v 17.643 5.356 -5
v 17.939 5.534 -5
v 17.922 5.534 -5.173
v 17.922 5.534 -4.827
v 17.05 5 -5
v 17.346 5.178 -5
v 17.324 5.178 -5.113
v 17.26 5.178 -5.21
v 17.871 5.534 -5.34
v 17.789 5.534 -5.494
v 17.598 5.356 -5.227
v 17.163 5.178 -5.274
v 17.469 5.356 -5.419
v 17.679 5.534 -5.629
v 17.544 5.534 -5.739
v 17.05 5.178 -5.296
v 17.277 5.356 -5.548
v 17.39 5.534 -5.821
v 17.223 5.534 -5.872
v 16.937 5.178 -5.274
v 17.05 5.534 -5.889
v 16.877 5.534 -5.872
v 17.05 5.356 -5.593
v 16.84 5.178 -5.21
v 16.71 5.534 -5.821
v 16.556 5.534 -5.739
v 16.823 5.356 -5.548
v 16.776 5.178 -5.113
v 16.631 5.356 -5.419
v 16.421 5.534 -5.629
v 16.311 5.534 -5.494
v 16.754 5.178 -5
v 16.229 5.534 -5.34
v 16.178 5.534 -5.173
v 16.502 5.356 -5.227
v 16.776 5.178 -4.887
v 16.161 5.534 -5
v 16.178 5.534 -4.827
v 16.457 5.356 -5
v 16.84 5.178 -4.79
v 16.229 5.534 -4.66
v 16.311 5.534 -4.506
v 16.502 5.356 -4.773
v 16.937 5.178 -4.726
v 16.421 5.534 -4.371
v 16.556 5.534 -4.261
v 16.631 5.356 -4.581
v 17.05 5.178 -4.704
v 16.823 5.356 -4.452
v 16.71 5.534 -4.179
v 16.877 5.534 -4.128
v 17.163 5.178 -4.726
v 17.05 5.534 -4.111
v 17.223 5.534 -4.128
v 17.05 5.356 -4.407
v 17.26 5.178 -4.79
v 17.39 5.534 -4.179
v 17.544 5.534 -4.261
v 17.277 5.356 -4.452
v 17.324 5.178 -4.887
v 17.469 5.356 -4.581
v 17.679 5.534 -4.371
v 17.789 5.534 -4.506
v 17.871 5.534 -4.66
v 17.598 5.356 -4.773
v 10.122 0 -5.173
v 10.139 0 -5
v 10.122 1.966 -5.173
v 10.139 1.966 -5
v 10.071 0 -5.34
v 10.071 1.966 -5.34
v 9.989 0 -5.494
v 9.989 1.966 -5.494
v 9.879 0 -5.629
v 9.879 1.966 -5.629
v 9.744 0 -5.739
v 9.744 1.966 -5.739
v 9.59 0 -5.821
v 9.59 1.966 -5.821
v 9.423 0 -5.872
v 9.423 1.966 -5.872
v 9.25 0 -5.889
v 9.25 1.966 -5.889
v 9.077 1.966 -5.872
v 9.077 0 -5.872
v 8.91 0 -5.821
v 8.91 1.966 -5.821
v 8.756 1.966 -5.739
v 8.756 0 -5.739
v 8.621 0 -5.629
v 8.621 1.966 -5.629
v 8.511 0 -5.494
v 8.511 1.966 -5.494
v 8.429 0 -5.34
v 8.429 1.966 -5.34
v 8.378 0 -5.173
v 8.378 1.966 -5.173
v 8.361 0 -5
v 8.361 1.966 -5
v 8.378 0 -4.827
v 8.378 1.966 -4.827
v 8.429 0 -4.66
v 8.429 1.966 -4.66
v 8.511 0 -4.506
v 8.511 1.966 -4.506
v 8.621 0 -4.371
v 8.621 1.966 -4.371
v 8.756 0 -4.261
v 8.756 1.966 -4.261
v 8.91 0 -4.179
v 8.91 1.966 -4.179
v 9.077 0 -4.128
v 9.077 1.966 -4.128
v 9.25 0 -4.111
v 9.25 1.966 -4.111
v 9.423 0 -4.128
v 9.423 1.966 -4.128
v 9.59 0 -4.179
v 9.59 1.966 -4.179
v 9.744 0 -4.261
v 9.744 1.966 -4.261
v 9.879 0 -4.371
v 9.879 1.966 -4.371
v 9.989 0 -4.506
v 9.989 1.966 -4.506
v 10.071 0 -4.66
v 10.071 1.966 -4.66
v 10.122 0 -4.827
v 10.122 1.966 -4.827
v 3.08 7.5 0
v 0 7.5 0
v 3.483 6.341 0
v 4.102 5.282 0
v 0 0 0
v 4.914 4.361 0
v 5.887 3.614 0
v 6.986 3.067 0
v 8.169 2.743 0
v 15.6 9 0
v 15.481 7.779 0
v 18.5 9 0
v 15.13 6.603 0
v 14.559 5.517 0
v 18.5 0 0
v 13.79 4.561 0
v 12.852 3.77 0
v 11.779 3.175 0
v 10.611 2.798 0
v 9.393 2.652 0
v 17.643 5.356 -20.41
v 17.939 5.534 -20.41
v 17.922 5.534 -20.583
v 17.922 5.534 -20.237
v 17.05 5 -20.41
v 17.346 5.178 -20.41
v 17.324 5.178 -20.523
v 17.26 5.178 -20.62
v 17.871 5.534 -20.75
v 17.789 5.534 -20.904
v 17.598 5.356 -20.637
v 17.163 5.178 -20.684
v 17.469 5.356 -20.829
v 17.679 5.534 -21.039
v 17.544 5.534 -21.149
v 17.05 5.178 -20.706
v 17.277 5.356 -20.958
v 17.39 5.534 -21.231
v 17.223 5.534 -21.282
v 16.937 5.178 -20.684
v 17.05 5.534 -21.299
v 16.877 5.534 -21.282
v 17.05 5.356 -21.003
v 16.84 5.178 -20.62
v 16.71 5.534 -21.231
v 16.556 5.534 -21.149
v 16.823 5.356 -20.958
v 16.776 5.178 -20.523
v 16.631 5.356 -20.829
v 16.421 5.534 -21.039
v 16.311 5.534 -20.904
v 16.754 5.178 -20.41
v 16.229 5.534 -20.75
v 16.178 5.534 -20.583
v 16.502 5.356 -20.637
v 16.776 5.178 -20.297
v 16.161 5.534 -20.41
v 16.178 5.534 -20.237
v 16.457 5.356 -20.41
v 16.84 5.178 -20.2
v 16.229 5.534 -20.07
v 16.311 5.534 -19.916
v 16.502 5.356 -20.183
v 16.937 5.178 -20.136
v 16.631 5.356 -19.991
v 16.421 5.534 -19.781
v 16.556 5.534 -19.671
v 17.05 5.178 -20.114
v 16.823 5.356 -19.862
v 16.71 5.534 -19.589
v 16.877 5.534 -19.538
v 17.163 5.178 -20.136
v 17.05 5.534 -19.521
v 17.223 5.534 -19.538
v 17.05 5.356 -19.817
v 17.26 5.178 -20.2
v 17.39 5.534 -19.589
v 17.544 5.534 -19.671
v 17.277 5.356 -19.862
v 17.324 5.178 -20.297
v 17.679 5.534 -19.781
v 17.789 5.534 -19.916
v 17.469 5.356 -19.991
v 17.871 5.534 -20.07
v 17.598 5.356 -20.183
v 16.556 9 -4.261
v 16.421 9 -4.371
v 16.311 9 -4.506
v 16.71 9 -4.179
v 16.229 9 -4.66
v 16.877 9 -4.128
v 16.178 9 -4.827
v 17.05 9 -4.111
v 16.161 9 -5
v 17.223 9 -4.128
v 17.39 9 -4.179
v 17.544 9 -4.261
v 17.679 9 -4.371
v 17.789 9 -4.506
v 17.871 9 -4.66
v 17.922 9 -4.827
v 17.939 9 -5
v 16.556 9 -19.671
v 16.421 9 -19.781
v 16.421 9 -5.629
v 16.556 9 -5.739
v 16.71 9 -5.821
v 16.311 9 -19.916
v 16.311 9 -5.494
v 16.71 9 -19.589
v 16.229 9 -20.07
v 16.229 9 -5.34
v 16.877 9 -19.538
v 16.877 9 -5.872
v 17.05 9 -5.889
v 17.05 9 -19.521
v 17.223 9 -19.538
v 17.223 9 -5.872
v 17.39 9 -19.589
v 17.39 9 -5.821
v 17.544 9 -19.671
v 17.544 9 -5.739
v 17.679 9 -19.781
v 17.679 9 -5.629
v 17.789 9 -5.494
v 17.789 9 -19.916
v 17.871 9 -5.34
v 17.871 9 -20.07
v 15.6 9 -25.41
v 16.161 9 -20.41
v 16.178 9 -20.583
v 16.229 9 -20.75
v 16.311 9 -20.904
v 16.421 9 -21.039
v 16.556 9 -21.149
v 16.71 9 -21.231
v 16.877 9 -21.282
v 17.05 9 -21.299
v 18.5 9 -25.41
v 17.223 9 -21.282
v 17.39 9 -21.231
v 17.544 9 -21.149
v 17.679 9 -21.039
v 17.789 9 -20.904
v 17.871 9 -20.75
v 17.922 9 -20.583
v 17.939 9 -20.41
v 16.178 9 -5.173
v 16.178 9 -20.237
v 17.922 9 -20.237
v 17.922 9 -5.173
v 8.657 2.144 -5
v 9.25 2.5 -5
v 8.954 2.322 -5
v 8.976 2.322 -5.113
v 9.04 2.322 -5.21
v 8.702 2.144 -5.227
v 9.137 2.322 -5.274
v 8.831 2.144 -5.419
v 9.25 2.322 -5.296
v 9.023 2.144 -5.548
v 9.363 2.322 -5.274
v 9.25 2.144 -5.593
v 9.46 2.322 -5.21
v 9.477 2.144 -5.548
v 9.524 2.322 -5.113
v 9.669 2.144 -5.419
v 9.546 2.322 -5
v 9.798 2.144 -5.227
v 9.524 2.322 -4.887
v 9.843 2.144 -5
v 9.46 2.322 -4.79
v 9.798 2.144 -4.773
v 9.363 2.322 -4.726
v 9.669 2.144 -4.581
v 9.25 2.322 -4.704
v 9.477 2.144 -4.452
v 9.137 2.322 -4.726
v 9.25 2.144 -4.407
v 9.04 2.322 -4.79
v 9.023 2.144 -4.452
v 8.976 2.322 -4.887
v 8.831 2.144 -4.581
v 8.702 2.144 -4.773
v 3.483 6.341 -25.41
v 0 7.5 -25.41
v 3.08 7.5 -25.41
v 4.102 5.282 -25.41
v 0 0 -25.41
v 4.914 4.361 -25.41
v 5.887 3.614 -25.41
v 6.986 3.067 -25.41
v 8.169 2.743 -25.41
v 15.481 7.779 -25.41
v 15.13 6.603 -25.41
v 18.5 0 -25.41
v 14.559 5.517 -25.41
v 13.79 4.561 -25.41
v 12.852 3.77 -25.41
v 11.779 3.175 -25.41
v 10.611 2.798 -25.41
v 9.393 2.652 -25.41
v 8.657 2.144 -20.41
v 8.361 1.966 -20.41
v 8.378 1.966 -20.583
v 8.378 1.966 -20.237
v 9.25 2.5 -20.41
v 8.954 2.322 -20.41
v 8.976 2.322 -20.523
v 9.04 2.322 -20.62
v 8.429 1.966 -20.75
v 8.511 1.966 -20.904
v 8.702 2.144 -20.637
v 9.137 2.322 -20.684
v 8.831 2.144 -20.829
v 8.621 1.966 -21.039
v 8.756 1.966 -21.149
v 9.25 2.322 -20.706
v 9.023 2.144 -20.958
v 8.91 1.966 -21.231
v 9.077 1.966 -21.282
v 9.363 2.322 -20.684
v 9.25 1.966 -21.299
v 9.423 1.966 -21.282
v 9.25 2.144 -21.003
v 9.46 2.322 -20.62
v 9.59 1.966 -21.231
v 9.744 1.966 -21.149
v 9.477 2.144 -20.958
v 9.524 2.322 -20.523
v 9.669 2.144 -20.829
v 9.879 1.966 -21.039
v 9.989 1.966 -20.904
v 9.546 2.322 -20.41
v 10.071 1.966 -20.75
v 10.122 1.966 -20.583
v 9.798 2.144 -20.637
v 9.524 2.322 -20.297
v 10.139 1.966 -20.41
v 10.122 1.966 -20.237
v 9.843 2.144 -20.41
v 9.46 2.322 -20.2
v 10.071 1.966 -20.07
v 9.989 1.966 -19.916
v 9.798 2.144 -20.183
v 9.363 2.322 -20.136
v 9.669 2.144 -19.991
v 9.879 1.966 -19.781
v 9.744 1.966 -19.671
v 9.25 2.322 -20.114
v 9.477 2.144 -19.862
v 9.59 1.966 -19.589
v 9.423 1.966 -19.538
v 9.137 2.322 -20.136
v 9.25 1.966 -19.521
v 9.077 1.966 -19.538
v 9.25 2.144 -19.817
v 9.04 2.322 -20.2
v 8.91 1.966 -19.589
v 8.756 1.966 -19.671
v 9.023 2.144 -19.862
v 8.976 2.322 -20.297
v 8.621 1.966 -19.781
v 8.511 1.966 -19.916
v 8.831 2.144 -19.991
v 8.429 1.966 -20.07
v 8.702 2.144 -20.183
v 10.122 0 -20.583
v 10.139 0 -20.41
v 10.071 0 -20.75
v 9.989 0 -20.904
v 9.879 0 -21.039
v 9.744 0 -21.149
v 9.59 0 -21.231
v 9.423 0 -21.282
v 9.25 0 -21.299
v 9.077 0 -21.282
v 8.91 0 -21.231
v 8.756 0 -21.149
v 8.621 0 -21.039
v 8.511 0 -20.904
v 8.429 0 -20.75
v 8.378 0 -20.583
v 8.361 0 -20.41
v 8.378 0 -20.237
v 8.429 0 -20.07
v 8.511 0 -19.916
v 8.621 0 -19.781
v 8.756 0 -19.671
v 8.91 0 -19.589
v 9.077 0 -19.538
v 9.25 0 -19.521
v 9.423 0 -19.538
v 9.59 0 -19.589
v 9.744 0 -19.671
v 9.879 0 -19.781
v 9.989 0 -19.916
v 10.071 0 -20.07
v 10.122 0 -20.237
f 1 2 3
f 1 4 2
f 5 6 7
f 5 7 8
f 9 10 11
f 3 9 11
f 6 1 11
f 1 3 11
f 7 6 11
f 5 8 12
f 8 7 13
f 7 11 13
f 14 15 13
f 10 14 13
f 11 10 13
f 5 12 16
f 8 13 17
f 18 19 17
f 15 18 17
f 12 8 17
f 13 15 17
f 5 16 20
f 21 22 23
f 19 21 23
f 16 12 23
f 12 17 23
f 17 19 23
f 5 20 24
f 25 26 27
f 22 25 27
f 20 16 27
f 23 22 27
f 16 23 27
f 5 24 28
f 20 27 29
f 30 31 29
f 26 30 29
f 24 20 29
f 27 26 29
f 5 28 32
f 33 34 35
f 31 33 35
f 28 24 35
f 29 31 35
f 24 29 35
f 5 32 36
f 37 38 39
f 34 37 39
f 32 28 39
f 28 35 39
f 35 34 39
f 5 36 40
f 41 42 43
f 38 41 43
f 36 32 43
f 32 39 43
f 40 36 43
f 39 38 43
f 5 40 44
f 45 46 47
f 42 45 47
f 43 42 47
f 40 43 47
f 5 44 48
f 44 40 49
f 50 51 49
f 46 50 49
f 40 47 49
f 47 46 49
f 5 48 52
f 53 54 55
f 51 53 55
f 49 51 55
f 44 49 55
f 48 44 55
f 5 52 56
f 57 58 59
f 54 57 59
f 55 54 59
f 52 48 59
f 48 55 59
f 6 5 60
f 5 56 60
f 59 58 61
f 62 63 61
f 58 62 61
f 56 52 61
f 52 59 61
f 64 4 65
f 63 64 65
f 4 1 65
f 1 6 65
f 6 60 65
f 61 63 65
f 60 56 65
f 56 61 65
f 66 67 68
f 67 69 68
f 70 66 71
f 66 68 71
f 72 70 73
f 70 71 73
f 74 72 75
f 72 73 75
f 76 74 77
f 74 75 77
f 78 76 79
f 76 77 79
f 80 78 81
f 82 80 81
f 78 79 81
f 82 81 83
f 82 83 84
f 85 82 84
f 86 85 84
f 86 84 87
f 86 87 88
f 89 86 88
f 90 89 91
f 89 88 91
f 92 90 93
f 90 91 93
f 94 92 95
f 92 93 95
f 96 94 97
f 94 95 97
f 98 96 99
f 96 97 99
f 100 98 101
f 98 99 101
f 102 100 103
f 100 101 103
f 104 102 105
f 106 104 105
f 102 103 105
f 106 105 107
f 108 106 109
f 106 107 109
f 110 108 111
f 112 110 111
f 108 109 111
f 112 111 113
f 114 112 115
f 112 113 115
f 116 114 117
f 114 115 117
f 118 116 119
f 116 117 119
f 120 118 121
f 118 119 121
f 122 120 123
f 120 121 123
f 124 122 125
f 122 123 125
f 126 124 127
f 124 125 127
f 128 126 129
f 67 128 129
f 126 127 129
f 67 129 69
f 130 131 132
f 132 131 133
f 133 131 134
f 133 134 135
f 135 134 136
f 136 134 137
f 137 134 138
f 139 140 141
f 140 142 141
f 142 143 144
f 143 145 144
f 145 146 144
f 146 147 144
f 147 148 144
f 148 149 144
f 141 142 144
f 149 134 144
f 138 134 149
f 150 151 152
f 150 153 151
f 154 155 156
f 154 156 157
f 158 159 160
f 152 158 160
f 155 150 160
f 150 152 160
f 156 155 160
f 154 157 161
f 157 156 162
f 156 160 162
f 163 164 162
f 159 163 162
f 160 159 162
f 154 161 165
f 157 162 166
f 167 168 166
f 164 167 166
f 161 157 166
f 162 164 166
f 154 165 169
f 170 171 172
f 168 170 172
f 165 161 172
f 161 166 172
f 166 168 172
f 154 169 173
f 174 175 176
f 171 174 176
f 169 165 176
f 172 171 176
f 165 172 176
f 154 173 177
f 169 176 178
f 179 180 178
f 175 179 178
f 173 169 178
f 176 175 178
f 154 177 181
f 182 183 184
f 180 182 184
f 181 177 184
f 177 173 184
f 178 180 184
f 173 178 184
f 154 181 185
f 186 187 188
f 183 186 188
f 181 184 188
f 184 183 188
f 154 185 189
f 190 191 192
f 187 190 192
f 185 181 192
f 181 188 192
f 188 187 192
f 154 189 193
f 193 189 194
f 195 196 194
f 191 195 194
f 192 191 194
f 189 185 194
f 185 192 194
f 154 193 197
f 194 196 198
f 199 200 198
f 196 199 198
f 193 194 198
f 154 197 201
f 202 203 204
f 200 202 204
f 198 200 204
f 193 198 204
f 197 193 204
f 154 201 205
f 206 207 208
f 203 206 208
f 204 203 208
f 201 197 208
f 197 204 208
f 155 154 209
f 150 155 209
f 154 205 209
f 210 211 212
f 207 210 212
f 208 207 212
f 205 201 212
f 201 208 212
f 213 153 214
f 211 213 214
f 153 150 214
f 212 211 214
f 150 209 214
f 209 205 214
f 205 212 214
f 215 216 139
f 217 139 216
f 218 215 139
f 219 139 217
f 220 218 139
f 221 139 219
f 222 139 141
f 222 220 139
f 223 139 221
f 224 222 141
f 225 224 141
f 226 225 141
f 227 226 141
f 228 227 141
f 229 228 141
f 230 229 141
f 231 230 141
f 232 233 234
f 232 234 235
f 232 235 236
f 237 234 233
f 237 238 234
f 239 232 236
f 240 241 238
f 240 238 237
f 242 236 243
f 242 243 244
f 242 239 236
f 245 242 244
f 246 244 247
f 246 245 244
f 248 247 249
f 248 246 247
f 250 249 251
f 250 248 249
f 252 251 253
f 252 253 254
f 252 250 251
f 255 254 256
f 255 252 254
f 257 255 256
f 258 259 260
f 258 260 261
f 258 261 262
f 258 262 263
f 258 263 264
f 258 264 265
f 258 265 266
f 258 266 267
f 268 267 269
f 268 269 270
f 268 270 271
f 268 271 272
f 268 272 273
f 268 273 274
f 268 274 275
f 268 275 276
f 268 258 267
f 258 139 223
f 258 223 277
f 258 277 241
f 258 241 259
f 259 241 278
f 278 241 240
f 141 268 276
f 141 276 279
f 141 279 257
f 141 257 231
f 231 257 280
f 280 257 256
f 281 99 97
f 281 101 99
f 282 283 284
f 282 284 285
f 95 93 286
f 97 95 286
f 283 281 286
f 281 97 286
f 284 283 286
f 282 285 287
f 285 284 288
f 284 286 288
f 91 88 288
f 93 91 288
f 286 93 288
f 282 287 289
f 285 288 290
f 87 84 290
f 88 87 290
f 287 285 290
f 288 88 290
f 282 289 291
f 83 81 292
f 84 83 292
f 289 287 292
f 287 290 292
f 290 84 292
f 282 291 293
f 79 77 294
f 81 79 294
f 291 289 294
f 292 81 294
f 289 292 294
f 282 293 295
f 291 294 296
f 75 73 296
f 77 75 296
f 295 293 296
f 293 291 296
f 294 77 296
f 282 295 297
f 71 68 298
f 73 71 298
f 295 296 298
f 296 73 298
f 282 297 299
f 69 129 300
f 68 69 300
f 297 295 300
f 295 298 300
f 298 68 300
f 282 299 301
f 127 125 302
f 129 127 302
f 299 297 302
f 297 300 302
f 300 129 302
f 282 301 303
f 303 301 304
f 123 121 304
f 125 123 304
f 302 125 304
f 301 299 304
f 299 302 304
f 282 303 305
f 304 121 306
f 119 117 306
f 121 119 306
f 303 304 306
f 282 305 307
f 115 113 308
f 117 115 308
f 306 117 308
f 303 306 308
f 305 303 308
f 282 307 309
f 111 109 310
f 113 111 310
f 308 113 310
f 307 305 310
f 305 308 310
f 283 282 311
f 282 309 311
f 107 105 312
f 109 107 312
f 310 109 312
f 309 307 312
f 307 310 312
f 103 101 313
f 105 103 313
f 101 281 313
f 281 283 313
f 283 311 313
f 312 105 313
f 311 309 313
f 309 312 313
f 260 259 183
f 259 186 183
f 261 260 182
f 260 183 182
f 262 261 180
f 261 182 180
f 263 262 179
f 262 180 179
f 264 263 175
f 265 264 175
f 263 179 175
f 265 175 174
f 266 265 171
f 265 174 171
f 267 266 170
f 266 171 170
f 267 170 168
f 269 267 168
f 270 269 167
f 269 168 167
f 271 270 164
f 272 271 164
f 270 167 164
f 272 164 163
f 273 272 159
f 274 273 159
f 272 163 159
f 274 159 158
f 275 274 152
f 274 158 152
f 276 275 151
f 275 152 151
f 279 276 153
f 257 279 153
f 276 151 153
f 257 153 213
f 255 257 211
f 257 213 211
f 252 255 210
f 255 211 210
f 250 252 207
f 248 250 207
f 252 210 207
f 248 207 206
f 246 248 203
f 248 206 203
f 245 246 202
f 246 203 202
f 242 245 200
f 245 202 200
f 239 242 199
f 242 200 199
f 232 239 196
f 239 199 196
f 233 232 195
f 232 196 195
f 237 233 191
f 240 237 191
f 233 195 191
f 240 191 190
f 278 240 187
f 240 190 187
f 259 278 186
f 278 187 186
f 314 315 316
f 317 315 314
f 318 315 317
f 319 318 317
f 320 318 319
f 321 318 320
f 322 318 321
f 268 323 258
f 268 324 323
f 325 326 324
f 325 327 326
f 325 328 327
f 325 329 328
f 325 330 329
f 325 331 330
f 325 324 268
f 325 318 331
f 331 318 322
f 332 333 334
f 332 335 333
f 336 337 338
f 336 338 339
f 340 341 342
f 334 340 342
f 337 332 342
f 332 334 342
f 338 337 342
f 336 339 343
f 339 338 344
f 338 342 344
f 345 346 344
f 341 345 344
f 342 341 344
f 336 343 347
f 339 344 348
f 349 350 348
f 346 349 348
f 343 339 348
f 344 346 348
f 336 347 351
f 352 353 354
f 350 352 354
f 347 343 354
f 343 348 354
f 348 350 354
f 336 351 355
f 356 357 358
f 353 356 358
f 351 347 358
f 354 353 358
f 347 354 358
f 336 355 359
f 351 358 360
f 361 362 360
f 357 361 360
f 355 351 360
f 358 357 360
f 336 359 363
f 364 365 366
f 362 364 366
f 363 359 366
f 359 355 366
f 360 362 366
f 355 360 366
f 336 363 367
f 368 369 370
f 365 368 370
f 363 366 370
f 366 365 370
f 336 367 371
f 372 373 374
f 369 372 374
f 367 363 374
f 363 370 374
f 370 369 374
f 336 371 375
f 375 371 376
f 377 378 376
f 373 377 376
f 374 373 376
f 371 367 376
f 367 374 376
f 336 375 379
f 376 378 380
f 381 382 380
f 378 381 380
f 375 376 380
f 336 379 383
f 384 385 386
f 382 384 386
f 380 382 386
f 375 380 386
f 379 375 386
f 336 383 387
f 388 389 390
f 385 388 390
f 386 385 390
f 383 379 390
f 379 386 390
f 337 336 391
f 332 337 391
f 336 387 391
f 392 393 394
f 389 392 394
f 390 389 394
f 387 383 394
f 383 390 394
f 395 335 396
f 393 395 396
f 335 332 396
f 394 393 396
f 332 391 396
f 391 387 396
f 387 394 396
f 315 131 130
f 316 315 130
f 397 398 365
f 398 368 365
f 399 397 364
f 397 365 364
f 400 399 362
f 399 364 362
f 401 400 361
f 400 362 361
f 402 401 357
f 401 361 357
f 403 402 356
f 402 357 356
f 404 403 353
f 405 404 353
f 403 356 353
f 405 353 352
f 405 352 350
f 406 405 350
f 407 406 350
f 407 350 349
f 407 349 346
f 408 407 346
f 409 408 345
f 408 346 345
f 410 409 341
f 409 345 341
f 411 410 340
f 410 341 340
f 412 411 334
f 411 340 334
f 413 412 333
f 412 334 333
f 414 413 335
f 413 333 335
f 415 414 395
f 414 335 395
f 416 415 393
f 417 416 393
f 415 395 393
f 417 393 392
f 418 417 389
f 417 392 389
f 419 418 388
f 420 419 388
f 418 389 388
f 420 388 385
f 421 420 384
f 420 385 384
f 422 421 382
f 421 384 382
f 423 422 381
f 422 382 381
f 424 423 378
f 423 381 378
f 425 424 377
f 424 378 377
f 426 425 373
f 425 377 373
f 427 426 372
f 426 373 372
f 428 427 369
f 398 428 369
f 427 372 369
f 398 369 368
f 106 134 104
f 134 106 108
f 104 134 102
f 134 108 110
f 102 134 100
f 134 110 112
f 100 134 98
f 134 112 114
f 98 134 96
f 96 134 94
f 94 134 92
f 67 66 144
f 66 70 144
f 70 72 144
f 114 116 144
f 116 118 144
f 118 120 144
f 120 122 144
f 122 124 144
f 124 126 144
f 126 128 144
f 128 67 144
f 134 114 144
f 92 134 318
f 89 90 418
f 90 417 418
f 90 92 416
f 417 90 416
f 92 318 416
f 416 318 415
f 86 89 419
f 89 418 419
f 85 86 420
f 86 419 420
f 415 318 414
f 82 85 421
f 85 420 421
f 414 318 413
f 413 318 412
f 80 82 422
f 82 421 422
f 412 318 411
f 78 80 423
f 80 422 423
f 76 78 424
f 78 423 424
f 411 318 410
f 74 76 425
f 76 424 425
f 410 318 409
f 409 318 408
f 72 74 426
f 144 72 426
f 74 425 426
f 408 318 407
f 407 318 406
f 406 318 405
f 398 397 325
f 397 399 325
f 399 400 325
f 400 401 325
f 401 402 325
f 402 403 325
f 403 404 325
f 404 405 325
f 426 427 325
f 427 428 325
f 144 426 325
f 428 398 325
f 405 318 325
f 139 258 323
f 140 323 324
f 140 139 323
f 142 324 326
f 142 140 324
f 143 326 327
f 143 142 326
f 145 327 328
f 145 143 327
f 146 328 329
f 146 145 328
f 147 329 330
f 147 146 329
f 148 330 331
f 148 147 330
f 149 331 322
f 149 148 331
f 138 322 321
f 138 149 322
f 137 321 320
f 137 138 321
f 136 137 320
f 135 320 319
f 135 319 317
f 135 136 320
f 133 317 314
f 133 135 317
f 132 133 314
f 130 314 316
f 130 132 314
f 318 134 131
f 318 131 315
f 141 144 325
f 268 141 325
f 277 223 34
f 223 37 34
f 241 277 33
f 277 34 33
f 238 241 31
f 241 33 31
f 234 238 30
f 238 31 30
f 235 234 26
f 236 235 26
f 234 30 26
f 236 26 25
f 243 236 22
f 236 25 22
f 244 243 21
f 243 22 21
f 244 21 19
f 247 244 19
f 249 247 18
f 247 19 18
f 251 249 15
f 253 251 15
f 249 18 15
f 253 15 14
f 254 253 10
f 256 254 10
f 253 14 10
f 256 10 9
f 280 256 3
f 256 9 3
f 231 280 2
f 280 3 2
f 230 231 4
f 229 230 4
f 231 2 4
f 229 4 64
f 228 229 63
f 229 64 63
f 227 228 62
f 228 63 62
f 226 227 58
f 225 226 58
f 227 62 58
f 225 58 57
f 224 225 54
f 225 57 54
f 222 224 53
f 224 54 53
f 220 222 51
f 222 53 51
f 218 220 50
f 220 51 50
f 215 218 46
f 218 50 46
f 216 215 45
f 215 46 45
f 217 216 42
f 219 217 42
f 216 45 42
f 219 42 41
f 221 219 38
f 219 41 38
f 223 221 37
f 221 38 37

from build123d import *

# Parameters (mm, degrees)
SKETCH2_W                 = 18.5
SKETCH2_H                 = 25.41
BOSS_EXTRUDE1_DEPTH       = 9
CUT_EXTRUDE1_DEPTH        = 25.41
F_2_56_TAPPED_HOLE1_D     = 1.778
F_2_56_TAPPED_HOLE1_DEPTH = 1.96583491
F_2_56_TAPPED_HOLE1_TIP   = 0.53416509
F_2_56_TAPPED_HOLE2_D     = 1.778
F_2_56_TAPPED_HOLE2_DEPTH = 3.46583491
F_2_56_TAPPED_HOLE2_TIP   = 0.53416509
CUT_EXTRUDE3_DEPTH        = 33.694312961
CUT_EXTRUDE3_DEPTH_BACK   = 25.41


with BuildPart() as part:
    # Sketch2 → Boss-Extrude1 (new body)
    with BuildSketch(Plane(origin=(0, 0, 0), x_dir=(1, 0, 0), z_dir=(0, 1, 0))):
        with Locations((9.25, 12.705)):
            Rectangle(SKETCH2_W, SKETCH2_H)
    extrude(amount=BOSS_EXTRUDE1_DEPTH)

    # Sketch6 → Cut-Extrude1 (cut)
    with BuildSketch(Plane.XY):
        with BuildLine():
            Line((2.9, 9), (15.6, 9))
            ThreePointArc((15.6, 9), (9.25, 2.65), (2.9, 9))
        make_face()
    extrude(amount=-CUT_EXTRUDE1_DEPTH, mode=Mode.SUBTRACT)

    # #2-56 Tapped Hole1
    with Locations(Plane(origin=(0, 0, 0), x_dir=(-1, 0, 0), z_dir=(0, -1, 0))):
        with Locations((-9.25, 20.41), (-9.25, 5)):
            Hole(F_2_56_TAPPED_HOLE1_D / 2, depth=F_2_56_TAPPED_HOLE1_DEPTH)
            with Locations((0, 0, -(F_2_56_TAPPED_HOLE1_DEPTH + F_2_56_TAPPED_HOLE1_TIP / 2))):  # 118° drill point
                Cone(0, F_2_56_TAPPED_HOLE1_D / 2, F_2_56_TAPPED_HOLE1_TIP, mode=Mode.SUBTRACT)

    # #2-56 Tapped Hole2
    with Locations(Plane(origin=(0, 9, 0), x_dir=(1, 0, 0), z_dir=(0, 1, 0))):
        with Locations((17.05, 20.41), (17.05, 5)):
            Hole(F_2_56_TAPPED_HOLE2_D / 2, depth=F_2_56_TAPPED_HOLE2_DEPTH)
            with Locations((0, 0, -(F_2_56_TAPPED_HOLE2_DEPTH + F_2_56_TAPPED_HOLE2_TIP / 2))):  # 118° drill point
                Cone(0, F_2_56_TAPPED_HOLE2_D / 2, F_2_56_TAPPED_HOLE2_TIP, mode=Mode.SUBTRACT)

    # Sketch14 → Cut-Extrude3 (cut, two sides: drawn at the far end of the back side and taken through both)
    with BuildSketch(Plane(origin=(0, 0, -25.41), x_dir=(-1, 0, 0), z_dir=(0, 0, -1)).offset(-CUT_EXTRUDE3_DEPTH_BACK)):
        Polygon((0, 60.146081223), (0, 9), (0, 7.5), (-3.246658661, 7.5), (-2.9, 9), (8.616604878, 58.832614185), (24.031387378, 159.956651774), (15.4147825, 161.270118812), align=None)
    extrude(amount=CUT_EXTRUDE3_DEPTH + CUT_EXTRUDE3_DEPTH_BACK, mode=Mode.SUBTRACT)


with BuildPart() as cut_extrude3_kept_piece:
    # of the separate pieces the step leaves, the one the design keeps (cut_extrude3_pieces_kept)
    add(part.part.solids().sort_by_distance((0, 0, 0))[0])


solid = cut_extrude3_kept_piece.part
